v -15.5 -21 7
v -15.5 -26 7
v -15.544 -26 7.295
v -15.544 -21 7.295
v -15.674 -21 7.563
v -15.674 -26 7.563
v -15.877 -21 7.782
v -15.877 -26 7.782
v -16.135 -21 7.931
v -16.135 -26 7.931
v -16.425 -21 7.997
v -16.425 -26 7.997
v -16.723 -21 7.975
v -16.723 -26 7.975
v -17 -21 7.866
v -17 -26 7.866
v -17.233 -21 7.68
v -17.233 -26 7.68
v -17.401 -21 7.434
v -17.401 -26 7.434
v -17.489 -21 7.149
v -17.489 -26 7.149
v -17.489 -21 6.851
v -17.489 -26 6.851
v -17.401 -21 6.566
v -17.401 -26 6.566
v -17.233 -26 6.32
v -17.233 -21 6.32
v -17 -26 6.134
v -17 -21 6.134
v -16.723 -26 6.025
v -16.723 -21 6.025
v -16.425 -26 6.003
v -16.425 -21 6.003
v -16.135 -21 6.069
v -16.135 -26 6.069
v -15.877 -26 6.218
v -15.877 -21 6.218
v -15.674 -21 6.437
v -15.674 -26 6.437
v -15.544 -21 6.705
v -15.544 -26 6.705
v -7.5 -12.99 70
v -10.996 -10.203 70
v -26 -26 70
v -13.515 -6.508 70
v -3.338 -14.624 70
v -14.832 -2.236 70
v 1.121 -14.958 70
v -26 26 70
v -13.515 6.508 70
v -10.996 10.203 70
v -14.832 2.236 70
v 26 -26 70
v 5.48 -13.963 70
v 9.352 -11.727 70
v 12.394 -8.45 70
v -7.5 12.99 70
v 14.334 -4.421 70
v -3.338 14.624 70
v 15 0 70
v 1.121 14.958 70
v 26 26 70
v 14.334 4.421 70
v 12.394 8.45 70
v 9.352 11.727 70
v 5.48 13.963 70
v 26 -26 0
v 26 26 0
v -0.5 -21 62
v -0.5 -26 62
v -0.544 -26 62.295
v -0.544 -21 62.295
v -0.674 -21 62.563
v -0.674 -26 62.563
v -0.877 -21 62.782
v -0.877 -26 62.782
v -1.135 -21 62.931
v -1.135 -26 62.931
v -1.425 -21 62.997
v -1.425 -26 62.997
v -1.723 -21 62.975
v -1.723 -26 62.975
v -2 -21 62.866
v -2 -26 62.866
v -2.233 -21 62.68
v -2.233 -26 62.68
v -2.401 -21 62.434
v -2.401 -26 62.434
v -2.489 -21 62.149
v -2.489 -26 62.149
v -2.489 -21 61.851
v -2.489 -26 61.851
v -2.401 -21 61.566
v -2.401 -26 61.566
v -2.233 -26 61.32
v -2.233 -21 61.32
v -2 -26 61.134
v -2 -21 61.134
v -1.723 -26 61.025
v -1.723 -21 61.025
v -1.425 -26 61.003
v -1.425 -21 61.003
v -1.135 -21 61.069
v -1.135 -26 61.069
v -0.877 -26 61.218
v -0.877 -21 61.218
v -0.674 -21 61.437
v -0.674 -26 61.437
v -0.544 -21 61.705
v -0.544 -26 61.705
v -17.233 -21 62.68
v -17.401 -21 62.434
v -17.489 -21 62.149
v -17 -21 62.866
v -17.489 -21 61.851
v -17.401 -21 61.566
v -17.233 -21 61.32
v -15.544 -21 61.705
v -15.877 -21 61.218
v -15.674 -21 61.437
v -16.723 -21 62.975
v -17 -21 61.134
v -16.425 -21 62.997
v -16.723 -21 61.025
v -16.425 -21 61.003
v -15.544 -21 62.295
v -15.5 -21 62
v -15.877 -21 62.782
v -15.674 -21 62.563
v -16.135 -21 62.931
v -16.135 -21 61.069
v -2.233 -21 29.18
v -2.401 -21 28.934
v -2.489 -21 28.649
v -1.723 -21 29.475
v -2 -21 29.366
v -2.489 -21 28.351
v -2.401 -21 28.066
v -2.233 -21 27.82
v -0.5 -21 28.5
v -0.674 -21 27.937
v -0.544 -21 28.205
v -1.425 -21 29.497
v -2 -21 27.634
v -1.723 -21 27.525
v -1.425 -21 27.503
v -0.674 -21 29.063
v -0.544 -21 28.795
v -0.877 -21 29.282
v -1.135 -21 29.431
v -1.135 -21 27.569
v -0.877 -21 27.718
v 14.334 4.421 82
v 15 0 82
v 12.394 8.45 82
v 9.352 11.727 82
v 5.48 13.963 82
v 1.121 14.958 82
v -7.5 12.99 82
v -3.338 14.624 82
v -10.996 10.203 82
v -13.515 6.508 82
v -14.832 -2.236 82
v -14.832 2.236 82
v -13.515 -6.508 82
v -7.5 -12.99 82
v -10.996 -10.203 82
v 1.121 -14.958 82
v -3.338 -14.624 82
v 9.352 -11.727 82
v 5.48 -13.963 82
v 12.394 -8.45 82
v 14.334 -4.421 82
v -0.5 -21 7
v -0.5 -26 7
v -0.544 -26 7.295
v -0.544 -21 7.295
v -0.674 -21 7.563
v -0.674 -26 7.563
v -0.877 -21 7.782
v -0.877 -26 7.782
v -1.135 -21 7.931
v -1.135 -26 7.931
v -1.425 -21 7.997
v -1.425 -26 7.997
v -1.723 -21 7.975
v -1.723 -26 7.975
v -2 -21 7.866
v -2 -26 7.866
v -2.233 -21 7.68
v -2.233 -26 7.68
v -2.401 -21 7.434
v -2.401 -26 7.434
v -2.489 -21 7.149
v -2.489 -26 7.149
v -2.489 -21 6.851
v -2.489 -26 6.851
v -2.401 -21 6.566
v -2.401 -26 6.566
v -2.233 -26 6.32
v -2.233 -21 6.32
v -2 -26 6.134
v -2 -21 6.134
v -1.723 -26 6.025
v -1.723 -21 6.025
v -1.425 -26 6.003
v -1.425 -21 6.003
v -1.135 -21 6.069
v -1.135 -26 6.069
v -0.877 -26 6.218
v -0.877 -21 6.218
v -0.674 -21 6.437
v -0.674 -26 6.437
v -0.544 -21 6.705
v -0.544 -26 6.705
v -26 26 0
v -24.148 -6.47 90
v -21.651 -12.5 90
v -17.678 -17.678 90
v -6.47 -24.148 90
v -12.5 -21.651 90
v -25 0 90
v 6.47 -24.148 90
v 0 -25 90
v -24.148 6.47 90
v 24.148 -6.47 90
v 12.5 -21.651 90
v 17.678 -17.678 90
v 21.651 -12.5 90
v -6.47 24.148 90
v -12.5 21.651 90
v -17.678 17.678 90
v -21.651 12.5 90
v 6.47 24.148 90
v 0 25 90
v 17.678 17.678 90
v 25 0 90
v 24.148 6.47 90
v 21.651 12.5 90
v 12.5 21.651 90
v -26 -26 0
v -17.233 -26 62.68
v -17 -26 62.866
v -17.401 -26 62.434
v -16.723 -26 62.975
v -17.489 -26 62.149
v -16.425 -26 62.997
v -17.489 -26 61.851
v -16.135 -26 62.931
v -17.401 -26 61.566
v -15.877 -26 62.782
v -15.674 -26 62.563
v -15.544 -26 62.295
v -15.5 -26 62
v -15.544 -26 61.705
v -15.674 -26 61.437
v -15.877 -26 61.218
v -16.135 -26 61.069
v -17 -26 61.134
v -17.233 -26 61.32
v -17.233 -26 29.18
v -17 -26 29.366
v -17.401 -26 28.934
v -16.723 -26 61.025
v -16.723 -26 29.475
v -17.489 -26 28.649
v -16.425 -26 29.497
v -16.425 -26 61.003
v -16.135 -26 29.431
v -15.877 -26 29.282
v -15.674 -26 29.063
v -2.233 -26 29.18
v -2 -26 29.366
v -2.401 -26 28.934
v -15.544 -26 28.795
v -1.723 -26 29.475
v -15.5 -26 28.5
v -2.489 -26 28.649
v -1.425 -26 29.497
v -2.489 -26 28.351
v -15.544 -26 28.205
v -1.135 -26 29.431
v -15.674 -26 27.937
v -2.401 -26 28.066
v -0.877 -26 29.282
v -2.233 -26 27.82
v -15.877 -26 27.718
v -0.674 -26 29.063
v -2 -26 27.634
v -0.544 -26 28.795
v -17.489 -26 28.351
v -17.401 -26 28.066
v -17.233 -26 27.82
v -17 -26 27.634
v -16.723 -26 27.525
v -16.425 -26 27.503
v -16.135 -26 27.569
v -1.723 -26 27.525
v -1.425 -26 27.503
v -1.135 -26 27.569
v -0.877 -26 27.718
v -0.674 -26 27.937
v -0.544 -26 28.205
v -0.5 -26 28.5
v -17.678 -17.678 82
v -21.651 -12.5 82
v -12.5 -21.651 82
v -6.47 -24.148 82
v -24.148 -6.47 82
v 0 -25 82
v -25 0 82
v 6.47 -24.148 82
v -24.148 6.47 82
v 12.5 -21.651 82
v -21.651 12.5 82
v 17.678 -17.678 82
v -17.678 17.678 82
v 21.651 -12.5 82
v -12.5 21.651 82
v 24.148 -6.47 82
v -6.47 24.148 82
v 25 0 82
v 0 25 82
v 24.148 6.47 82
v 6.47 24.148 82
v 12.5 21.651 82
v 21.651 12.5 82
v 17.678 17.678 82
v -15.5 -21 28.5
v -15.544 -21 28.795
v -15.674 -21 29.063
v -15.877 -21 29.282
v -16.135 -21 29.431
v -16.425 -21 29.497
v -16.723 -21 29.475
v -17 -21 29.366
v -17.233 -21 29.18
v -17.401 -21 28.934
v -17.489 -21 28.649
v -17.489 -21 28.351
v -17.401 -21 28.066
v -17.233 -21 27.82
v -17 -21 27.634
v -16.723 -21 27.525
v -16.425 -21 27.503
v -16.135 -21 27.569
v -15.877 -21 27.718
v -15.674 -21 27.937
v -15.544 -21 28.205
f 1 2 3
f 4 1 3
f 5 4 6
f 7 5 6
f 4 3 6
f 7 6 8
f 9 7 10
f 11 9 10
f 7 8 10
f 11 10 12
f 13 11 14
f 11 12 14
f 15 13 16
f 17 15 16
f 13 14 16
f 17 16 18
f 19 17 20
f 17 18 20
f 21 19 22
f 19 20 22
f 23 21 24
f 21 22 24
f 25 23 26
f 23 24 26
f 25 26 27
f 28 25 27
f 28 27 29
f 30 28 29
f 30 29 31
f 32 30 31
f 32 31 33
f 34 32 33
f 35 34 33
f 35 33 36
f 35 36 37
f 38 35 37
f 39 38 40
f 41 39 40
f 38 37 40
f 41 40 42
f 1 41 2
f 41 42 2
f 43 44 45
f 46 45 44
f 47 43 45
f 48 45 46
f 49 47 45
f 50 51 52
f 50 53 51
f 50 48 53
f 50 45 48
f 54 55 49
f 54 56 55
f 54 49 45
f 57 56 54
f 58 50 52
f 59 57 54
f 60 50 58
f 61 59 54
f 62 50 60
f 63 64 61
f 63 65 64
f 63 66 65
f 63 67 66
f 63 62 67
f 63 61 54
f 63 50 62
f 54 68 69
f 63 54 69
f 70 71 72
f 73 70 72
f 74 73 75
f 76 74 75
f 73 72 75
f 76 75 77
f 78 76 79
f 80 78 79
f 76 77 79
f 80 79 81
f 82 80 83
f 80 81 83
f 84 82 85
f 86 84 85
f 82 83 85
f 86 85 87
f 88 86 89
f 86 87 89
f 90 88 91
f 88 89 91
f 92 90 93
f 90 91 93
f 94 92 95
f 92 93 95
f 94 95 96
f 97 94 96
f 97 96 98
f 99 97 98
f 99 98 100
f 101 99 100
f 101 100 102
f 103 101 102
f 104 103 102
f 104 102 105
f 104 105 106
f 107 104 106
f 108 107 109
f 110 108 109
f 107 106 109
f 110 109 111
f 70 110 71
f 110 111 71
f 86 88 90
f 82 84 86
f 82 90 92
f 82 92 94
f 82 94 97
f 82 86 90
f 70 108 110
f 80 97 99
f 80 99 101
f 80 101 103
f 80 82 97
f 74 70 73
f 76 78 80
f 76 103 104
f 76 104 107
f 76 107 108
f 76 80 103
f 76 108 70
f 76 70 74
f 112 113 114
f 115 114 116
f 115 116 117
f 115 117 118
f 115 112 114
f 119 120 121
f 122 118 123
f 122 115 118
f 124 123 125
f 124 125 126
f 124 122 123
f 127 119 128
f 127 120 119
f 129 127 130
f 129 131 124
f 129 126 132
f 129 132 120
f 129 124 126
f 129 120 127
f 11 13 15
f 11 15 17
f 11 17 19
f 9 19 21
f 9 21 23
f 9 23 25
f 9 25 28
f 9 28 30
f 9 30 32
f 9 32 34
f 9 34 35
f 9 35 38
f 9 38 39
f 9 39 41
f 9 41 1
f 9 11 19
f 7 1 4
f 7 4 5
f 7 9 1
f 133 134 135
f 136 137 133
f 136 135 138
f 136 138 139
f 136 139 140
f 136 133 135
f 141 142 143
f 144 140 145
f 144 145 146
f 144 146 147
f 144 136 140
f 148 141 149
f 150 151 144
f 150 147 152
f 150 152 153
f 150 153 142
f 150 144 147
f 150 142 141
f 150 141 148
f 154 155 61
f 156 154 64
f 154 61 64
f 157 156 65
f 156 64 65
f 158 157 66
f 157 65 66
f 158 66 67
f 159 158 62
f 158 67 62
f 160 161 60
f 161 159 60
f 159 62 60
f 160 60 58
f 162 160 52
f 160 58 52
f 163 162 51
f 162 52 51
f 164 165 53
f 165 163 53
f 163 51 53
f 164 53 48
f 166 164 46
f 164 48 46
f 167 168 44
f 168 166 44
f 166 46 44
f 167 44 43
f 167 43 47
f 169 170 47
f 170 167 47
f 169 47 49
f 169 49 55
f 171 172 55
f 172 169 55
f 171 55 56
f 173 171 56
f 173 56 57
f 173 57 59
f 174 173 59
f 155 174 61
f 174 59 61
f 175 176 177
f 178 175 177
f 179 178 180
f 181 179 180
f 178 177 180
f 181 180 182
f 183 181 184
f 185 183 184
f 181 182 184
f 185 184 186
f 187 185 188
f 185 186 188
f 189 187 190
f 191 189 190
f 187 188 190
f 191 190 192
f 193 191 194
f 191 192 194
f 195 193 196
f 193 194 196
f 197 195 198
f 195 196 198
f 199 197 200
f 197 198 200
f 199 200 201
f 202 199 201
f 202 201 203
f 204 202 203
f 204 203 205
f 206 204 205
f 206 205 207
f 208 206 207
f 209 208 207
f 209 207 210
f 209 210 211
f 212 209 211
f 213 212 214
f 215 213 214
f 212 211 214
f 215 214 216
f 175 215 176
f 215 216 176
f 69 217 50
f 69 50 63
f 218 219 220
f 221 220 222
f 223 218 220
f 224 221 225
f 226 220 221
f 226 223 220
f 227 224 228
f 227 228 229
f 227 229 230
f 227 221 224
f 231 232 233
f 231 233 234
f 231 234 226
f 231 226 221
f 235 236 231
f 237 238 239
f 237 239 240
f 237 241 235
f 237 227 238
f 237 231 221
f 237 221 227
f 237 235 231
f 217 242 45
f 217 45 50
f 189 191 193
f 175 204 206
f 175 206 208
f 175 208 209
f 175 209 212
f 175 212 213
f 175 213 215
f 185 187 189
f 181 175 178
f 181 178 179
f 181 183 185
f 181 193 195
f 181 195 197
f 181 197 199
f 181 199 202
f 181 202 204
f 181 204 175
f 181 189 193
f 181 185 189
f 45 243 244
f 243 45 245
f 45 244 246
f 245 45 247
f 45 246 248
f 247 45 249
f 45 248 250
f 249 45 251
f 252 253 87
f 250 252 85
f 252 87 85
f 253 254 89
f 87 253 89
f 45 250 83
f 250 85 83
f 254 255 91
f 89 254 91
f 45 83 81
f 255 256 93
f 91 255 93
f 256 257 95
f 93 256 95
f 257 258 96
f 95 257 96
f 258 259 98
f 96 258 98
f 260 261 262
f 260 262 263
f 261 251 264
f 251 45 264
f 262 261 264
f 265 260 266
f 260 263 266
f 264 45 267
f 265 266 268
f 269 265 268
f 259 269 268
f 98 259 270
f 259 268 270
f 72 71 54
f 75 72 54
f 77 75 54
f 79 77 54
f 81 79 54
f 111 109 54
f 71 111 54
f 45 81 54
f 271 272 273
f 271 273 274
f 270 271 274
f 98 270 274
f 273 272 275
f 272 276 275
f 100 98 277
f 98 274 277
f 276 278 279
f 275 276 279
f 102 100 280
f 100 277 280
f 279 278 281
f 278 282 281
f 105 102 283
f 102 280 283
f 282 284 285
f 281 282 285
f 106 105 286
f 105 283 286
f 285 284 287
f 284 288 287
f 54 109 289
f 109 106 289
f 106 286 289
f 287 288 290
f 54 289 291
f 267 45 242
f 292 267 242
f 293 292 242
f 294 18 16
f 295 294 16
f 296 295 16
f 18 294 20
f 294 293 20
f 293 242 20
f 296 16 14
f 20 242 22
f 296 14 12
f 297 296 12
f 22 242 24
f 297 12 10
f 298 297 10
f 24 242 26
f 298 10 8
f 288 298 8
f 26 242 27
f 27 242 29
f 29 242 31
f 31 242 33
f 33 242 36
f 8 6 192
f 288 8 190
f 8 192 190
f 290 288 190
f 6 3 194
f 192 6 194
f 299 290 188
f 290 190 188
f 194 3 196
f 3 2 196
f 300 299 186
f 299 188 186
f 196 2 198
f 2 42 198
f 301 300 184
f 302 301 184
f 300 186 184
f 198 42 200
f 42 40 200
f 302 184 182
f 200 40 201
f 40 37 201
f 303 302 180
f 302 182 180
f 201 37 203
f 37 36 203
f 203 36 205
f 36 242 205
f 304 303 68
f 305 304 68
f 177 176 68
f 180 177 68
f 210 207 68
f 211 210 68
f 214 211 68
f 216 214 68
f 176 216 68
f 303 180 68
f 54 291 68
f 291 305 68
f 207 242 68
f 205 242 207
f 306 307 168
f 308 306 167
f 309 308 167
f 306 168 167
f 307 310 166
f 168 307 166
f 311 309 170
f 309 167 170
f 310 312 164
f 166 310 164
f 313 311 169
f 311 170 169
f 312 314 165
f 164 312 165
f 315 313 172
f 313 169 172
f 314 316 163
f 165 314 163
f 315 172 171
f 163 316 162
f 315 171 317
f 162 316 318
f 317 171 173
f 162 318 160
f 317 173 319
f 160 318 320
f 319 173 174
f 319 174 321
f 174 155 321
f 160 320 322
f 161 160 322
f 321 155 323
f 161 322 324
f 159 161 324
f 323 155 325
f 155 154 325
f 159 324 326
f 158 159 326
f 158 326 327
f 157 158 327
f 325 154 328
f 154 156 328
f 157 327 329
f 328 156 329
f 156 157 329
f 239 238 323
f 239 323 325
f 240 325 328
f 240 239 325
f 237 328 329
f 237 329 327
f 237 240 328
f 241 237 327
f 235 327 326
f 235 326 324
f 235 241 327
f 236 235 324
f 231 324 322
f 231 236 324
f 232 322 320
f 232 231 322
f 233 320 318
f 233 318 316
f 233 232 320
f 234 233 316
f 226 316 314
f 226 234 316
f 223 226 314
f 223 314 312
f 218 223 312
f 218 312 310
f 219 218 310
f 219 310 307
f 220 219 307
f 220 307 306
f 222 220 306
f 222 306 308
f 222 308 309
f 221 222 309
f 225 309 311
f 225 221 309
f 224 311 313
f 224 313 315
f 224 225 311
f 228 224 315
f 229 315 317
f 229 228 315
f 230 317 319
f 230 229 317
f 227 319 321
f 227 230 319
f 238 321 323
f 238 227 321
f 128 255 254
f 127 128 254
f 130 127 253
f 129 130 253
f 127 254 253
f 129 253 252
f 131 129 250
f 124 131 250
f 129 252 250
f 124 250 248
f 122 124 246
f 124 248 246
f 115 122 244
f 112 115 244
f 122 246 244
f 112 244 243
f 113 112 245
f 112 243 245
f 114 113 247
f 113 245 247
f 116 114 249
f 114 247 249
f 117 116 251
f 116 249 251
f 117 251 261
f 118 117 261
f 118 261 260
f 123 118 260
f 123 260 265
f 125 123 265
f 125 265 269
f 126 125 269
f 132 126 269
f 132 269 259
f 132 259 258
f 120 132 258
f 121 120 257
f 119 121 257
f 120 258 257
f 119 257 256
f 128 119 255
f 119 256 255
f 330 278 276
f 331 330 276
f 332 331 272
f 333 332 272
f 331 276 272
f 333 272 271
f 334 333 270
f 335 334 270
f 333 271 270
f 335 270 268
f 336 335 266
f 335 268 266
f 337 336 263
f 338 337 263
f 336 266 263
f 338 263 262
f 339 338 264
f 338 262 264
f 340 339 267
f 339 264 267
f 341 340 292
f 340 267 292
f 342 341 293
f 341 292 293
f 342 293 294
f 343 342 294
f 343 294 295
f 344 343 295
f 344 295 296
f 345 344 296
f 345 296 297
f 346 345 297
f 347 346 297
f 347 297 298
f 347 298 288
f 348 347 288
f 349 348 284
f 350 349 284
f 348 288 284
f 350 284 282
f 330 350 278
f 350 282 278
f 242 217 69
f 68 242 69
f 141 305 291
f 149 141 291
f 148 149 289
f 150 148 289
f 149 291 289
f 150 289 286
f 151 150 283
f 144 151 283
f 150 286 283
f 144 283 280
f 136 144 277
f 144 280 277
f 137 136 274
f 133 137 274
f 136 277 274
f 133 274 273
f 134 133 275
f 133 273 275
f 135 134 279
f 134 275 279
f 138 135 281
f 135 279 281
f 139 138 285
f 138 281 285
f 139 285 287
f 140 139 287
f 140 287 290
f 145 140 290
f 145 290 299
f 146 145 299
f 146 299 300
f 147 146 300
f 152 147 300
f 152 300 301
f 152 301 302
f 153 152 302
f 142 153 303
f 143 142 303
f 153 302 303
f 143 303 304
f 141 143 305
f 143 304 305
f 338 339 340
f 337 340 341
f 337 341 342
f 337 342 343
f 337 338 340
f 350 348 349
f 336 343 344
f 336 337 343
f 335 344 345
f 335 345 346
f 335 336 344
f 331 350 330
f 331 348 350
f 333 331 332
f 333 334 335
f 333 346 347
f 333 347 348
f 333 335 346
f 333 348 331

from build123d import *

# Parameters (mm, degrees)
SKETCH2_W           = 52
SKETCH2_H           = 52
BOSS_EXTRUDE1_DEPTH = 70
SKETCH3_R           = 15
BOSS_EXTRUDE2_DEPTH = 20
SKETCH4_R           = 1
CUT_EXTRUDE1_DEPTH  = 5
SKETCH5_R           = 25
BOSS_EXTRUDE3_DEPTH = 8


with BuildPart() as part:
    # Sketch2 → Boss-Extrude1 (new body)
    with BuildSketch(Plane.XY):
        Rectangle(SKETCH2_W, SKETCH2_H)
    extrude(amount=BOSS_EXTRUDE1_DEPTH)

    # Sketch3 → Boss-Extrude2 (add)
    with BuildSketch(Plane.XY.offset(70)):
        Circle(SKETCH3_R)
    extrude(amount=BOSS_EXTRUDE2_DEPTH)

    # Sketch4 → Cut-Extrude1 (cut)
    with BuildSketch(Plane.XZ.offset(26)):
        with Locations((-16.5, 62)):
            Circle(SKETCH4_R)
        with Locations((-16.5, 28.5)):
            Circle(SKETCH4_R)
        with Locations((-1.5, 62)):
            Circle(SKETCH4_R)
        with Locations((-1.5, 28.5)):
            Circle(SKETCH4_R)
        with Locations((-1.5, 7)):
            Circle(SKETCH4_R)
        with Locations((-16.5, 7)):
            Circle(SKETCH4_R)
    extrude(amount=-CUT_EXTRUDE1_DEPTH, mode=Mode.SUBTRACT)

    # Sketch5 → Boss-Extrude3 (add)
    with BuildSketch(Plane.XY.offset(90)):
        Circle(SKETCH5_R)
    extrude(amount=-BOSS_EXTRUDE3_DEPTH)


solid = part.part
